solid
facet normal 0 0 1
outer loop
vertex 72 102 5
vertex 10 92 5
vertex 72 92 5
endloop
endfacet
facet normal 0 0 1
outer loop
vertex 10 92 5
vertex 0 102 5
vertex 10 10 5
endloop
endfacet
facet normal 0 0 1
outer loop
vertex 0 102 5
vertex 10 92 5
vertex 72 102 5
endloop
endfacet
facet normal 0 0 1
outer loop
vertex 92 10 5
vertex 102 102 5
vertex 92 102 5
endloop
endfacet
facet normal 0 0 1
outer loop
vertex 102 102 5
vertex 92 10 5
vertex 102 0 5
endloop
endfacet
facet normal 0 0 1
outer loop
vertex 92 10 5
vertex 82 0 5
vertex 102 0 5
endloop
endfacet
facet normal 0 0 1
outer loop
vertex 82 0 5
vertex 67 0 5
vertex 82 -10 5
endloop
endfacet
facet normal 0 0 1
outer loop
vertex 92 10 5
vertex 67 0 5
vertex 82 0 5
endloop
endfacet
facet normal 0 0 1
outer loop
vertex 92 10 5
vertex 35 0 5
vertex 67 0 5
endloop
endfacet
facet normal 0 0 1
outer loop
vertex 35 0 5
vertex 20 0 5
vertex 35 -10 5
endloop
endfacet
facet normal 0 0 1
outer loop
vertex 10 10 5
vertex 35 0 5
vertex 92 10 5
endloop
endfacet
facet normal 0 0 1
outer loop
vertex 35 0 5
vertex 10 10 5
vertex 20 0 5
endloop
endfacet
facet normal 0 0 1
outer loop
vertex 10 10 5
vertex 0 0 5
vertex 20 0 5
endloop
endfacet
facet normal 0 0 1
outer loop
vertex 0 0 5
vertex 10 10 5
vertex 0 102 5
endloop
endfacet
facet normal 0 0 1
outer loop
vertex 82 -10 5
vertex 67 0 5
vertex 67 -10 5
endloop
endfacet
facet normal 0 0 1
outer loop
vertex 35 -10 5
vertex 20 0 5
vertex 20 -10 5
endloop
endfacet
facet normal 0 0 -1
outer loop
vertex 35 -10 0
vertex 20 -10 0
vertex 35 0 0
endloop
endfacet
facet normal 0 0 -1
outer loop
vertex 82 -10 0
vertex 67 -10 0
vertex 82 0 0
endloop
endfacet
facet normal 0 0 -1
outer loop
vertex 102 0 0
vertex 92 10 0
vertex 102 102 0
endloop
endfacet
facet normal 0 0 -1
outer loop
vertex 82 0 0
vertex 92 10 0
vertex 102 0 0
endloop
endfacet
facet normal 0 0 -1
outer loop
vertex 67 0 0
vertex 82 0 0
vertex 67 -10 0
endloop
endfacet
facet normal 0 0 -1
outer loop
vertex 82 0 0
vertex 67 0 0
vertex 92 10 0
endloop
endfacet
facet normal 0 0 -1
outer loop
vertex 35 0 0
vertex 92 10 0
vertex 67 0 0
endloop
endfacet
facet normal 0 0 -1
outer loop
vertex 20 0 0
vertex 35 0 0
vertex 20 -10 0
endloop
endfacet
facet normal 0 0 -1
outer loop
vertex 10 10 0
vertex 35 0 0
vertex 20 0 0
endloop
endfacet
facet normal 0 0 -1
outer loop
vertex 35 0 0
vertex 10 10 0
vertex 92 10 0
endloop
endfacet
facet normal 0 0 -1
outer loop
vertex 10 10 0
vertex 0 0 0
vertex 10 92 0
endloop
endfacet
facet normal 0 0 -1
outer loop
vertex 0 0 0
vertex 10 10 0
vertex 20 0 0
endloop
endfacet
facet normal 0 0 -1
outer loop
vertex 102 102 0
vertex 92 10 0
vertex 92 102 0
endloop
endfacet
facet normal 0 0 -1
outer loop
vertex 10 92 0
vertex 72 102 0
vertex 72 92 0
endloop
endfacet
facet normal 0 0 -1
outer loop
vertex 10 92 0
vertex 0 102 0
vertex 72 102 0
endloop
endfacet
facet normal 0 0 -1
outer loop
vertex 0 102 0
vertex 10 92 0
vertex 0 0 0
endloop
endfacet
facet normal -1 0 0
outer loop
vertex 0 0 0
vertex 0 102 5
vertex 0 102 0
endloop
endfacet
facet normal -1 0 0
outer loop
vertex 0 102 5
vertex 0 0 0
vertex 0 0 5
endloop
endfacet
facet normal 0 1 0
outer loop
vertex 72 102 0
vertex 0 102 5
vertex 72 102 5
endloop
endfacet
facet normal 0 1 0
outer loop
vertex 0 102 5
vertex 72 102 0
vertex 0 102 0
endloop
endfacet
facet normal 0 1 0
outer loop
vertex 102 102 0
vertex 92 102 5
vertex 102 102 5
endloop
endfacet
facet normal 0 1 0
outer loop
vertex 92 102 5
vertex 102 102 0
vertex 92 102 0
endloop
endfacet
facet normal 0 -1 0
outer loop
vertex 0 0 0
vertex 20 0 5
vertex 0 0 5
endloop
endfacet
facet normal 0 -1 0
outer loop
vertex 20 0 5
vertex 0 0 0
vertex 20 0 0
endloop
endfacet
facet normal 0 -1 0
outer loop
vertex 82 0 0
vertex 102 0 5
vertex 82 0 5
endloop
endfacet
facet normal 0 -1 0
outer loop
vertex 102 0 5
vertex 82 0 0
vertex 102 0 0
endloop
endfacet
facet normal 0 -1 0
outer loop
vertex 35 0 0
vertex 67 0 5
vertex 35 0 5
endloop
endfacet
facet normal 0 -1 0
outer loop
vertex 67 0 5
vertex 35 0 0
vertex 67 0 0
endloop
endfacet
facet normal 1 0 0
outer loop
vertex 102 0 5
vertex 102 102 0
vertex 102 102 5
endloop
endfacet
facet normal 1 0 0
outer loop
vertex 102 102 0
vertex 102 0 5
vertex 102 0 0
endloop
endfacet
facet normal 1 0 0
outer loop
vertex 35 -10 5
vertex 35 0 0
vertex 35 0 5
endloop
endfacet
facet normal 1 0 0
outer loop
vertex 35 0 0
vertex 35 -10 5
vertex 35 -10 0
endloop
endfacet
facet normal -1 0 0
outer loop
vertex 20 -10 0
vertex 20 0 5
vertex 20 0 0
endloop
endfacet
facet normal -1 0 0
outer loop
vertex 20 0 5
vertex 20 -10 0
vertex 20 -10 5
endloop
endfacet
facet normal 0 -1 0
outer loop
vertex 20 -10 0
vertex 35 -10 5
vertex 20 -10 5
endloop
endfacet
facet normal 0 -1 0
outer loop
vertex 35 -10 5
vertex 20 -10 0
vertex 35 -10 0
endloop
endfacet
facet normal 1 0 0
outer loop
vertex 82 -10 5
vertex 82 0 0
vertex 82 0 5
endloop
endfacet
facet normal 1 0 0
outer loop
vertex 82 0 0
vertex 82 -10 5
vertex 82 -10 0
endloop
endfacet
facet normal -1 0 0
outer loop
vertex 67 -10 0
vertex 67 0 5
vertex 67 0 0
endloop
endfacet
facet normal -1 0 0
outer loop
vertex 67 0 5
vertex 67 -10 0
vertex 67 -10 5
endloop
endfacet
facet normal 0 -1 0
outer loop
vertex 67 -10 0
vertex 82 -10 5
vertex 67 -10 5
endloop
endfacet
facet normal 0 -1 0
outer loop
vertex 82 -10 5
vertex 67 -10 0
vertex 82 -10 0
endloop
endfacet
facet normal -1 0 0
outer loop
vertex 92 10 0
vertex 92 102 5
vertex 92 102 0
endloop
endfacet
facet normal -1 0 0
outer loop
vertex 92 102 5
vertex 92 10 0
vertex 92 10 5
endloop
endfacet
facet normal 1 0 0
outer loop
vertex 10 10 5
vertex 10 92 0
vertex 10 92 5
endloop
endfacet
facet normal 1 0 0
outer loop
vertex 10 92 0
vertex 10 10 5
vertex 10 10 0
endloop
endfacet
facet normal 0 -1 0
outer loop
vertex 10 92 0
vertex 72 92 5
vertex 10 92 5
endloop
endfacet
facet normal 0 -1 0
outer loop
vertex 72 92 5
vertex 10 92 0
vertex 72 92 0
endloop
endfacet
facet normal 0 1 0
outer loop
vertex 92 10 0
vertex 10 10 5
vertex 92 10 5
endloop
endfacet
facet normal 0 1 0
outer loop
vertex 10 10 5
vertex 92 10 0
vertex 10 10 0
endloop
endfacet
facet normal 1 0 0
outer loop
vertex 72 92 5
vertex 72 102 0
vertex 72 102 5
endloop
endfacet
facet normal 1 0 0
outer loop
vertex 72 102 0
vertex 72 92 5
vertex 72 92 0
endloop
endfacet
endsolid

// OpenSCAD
// Parameters
pc_width = 82;
pc_height = 82;
pc_depth = 40;
bracket_thickness = 5;
flange_width = 10;
din_clip_width = 15;
din_clip_height = 10;
cable_clearance = 20;

// Main bracket body
module bracket_body() {
    cube([pc_width + 2*flange_width, pc_height + 2*flange_width, bracket_thickness]);
}

// Cutout for C6015
module pc_cutout() {
    translate([flange_width, flange_width, -1])
        cube([pc_width, pc_height, bracket_thickness + 2]);
}

// Side flanges
module side_flanges() {
    translate([0, 0, 0])
        cube([flange_width, pc_height + 2*flange_width, bracket_thickness]);
    translate([pc_width + flange_width, 0, 0])
        cube([flange_width, pc_height + 2*flange_width, bracket_thickness]);
}

// DIN rail clips (simplified)
module din_clips() {
    translate([flange_width + 10, -din_clip_height, 0])
        cube([din_clip_width, din_clip_height, bracket_thickness]);
    translate([flange_width + pc_width - 25, -din_clip_height, 0])
        cube([din_clip_width, din_clip_height, bracket_thickness]);
}

// Cable routing clearance
module cable_clearance_zone() {
    translate([flange_width + pc_width - cable_clearance, flange_width + pc_height, 0])
        cube([cable_clearance, cable_clearance, bracket_thickness]);
}

// Full assembly
difference() {
    union() {
        bracket_body();
        side_flanges();
        din_clips();
    }
    pc_cutout();
    cable_clearance_zone();
}
